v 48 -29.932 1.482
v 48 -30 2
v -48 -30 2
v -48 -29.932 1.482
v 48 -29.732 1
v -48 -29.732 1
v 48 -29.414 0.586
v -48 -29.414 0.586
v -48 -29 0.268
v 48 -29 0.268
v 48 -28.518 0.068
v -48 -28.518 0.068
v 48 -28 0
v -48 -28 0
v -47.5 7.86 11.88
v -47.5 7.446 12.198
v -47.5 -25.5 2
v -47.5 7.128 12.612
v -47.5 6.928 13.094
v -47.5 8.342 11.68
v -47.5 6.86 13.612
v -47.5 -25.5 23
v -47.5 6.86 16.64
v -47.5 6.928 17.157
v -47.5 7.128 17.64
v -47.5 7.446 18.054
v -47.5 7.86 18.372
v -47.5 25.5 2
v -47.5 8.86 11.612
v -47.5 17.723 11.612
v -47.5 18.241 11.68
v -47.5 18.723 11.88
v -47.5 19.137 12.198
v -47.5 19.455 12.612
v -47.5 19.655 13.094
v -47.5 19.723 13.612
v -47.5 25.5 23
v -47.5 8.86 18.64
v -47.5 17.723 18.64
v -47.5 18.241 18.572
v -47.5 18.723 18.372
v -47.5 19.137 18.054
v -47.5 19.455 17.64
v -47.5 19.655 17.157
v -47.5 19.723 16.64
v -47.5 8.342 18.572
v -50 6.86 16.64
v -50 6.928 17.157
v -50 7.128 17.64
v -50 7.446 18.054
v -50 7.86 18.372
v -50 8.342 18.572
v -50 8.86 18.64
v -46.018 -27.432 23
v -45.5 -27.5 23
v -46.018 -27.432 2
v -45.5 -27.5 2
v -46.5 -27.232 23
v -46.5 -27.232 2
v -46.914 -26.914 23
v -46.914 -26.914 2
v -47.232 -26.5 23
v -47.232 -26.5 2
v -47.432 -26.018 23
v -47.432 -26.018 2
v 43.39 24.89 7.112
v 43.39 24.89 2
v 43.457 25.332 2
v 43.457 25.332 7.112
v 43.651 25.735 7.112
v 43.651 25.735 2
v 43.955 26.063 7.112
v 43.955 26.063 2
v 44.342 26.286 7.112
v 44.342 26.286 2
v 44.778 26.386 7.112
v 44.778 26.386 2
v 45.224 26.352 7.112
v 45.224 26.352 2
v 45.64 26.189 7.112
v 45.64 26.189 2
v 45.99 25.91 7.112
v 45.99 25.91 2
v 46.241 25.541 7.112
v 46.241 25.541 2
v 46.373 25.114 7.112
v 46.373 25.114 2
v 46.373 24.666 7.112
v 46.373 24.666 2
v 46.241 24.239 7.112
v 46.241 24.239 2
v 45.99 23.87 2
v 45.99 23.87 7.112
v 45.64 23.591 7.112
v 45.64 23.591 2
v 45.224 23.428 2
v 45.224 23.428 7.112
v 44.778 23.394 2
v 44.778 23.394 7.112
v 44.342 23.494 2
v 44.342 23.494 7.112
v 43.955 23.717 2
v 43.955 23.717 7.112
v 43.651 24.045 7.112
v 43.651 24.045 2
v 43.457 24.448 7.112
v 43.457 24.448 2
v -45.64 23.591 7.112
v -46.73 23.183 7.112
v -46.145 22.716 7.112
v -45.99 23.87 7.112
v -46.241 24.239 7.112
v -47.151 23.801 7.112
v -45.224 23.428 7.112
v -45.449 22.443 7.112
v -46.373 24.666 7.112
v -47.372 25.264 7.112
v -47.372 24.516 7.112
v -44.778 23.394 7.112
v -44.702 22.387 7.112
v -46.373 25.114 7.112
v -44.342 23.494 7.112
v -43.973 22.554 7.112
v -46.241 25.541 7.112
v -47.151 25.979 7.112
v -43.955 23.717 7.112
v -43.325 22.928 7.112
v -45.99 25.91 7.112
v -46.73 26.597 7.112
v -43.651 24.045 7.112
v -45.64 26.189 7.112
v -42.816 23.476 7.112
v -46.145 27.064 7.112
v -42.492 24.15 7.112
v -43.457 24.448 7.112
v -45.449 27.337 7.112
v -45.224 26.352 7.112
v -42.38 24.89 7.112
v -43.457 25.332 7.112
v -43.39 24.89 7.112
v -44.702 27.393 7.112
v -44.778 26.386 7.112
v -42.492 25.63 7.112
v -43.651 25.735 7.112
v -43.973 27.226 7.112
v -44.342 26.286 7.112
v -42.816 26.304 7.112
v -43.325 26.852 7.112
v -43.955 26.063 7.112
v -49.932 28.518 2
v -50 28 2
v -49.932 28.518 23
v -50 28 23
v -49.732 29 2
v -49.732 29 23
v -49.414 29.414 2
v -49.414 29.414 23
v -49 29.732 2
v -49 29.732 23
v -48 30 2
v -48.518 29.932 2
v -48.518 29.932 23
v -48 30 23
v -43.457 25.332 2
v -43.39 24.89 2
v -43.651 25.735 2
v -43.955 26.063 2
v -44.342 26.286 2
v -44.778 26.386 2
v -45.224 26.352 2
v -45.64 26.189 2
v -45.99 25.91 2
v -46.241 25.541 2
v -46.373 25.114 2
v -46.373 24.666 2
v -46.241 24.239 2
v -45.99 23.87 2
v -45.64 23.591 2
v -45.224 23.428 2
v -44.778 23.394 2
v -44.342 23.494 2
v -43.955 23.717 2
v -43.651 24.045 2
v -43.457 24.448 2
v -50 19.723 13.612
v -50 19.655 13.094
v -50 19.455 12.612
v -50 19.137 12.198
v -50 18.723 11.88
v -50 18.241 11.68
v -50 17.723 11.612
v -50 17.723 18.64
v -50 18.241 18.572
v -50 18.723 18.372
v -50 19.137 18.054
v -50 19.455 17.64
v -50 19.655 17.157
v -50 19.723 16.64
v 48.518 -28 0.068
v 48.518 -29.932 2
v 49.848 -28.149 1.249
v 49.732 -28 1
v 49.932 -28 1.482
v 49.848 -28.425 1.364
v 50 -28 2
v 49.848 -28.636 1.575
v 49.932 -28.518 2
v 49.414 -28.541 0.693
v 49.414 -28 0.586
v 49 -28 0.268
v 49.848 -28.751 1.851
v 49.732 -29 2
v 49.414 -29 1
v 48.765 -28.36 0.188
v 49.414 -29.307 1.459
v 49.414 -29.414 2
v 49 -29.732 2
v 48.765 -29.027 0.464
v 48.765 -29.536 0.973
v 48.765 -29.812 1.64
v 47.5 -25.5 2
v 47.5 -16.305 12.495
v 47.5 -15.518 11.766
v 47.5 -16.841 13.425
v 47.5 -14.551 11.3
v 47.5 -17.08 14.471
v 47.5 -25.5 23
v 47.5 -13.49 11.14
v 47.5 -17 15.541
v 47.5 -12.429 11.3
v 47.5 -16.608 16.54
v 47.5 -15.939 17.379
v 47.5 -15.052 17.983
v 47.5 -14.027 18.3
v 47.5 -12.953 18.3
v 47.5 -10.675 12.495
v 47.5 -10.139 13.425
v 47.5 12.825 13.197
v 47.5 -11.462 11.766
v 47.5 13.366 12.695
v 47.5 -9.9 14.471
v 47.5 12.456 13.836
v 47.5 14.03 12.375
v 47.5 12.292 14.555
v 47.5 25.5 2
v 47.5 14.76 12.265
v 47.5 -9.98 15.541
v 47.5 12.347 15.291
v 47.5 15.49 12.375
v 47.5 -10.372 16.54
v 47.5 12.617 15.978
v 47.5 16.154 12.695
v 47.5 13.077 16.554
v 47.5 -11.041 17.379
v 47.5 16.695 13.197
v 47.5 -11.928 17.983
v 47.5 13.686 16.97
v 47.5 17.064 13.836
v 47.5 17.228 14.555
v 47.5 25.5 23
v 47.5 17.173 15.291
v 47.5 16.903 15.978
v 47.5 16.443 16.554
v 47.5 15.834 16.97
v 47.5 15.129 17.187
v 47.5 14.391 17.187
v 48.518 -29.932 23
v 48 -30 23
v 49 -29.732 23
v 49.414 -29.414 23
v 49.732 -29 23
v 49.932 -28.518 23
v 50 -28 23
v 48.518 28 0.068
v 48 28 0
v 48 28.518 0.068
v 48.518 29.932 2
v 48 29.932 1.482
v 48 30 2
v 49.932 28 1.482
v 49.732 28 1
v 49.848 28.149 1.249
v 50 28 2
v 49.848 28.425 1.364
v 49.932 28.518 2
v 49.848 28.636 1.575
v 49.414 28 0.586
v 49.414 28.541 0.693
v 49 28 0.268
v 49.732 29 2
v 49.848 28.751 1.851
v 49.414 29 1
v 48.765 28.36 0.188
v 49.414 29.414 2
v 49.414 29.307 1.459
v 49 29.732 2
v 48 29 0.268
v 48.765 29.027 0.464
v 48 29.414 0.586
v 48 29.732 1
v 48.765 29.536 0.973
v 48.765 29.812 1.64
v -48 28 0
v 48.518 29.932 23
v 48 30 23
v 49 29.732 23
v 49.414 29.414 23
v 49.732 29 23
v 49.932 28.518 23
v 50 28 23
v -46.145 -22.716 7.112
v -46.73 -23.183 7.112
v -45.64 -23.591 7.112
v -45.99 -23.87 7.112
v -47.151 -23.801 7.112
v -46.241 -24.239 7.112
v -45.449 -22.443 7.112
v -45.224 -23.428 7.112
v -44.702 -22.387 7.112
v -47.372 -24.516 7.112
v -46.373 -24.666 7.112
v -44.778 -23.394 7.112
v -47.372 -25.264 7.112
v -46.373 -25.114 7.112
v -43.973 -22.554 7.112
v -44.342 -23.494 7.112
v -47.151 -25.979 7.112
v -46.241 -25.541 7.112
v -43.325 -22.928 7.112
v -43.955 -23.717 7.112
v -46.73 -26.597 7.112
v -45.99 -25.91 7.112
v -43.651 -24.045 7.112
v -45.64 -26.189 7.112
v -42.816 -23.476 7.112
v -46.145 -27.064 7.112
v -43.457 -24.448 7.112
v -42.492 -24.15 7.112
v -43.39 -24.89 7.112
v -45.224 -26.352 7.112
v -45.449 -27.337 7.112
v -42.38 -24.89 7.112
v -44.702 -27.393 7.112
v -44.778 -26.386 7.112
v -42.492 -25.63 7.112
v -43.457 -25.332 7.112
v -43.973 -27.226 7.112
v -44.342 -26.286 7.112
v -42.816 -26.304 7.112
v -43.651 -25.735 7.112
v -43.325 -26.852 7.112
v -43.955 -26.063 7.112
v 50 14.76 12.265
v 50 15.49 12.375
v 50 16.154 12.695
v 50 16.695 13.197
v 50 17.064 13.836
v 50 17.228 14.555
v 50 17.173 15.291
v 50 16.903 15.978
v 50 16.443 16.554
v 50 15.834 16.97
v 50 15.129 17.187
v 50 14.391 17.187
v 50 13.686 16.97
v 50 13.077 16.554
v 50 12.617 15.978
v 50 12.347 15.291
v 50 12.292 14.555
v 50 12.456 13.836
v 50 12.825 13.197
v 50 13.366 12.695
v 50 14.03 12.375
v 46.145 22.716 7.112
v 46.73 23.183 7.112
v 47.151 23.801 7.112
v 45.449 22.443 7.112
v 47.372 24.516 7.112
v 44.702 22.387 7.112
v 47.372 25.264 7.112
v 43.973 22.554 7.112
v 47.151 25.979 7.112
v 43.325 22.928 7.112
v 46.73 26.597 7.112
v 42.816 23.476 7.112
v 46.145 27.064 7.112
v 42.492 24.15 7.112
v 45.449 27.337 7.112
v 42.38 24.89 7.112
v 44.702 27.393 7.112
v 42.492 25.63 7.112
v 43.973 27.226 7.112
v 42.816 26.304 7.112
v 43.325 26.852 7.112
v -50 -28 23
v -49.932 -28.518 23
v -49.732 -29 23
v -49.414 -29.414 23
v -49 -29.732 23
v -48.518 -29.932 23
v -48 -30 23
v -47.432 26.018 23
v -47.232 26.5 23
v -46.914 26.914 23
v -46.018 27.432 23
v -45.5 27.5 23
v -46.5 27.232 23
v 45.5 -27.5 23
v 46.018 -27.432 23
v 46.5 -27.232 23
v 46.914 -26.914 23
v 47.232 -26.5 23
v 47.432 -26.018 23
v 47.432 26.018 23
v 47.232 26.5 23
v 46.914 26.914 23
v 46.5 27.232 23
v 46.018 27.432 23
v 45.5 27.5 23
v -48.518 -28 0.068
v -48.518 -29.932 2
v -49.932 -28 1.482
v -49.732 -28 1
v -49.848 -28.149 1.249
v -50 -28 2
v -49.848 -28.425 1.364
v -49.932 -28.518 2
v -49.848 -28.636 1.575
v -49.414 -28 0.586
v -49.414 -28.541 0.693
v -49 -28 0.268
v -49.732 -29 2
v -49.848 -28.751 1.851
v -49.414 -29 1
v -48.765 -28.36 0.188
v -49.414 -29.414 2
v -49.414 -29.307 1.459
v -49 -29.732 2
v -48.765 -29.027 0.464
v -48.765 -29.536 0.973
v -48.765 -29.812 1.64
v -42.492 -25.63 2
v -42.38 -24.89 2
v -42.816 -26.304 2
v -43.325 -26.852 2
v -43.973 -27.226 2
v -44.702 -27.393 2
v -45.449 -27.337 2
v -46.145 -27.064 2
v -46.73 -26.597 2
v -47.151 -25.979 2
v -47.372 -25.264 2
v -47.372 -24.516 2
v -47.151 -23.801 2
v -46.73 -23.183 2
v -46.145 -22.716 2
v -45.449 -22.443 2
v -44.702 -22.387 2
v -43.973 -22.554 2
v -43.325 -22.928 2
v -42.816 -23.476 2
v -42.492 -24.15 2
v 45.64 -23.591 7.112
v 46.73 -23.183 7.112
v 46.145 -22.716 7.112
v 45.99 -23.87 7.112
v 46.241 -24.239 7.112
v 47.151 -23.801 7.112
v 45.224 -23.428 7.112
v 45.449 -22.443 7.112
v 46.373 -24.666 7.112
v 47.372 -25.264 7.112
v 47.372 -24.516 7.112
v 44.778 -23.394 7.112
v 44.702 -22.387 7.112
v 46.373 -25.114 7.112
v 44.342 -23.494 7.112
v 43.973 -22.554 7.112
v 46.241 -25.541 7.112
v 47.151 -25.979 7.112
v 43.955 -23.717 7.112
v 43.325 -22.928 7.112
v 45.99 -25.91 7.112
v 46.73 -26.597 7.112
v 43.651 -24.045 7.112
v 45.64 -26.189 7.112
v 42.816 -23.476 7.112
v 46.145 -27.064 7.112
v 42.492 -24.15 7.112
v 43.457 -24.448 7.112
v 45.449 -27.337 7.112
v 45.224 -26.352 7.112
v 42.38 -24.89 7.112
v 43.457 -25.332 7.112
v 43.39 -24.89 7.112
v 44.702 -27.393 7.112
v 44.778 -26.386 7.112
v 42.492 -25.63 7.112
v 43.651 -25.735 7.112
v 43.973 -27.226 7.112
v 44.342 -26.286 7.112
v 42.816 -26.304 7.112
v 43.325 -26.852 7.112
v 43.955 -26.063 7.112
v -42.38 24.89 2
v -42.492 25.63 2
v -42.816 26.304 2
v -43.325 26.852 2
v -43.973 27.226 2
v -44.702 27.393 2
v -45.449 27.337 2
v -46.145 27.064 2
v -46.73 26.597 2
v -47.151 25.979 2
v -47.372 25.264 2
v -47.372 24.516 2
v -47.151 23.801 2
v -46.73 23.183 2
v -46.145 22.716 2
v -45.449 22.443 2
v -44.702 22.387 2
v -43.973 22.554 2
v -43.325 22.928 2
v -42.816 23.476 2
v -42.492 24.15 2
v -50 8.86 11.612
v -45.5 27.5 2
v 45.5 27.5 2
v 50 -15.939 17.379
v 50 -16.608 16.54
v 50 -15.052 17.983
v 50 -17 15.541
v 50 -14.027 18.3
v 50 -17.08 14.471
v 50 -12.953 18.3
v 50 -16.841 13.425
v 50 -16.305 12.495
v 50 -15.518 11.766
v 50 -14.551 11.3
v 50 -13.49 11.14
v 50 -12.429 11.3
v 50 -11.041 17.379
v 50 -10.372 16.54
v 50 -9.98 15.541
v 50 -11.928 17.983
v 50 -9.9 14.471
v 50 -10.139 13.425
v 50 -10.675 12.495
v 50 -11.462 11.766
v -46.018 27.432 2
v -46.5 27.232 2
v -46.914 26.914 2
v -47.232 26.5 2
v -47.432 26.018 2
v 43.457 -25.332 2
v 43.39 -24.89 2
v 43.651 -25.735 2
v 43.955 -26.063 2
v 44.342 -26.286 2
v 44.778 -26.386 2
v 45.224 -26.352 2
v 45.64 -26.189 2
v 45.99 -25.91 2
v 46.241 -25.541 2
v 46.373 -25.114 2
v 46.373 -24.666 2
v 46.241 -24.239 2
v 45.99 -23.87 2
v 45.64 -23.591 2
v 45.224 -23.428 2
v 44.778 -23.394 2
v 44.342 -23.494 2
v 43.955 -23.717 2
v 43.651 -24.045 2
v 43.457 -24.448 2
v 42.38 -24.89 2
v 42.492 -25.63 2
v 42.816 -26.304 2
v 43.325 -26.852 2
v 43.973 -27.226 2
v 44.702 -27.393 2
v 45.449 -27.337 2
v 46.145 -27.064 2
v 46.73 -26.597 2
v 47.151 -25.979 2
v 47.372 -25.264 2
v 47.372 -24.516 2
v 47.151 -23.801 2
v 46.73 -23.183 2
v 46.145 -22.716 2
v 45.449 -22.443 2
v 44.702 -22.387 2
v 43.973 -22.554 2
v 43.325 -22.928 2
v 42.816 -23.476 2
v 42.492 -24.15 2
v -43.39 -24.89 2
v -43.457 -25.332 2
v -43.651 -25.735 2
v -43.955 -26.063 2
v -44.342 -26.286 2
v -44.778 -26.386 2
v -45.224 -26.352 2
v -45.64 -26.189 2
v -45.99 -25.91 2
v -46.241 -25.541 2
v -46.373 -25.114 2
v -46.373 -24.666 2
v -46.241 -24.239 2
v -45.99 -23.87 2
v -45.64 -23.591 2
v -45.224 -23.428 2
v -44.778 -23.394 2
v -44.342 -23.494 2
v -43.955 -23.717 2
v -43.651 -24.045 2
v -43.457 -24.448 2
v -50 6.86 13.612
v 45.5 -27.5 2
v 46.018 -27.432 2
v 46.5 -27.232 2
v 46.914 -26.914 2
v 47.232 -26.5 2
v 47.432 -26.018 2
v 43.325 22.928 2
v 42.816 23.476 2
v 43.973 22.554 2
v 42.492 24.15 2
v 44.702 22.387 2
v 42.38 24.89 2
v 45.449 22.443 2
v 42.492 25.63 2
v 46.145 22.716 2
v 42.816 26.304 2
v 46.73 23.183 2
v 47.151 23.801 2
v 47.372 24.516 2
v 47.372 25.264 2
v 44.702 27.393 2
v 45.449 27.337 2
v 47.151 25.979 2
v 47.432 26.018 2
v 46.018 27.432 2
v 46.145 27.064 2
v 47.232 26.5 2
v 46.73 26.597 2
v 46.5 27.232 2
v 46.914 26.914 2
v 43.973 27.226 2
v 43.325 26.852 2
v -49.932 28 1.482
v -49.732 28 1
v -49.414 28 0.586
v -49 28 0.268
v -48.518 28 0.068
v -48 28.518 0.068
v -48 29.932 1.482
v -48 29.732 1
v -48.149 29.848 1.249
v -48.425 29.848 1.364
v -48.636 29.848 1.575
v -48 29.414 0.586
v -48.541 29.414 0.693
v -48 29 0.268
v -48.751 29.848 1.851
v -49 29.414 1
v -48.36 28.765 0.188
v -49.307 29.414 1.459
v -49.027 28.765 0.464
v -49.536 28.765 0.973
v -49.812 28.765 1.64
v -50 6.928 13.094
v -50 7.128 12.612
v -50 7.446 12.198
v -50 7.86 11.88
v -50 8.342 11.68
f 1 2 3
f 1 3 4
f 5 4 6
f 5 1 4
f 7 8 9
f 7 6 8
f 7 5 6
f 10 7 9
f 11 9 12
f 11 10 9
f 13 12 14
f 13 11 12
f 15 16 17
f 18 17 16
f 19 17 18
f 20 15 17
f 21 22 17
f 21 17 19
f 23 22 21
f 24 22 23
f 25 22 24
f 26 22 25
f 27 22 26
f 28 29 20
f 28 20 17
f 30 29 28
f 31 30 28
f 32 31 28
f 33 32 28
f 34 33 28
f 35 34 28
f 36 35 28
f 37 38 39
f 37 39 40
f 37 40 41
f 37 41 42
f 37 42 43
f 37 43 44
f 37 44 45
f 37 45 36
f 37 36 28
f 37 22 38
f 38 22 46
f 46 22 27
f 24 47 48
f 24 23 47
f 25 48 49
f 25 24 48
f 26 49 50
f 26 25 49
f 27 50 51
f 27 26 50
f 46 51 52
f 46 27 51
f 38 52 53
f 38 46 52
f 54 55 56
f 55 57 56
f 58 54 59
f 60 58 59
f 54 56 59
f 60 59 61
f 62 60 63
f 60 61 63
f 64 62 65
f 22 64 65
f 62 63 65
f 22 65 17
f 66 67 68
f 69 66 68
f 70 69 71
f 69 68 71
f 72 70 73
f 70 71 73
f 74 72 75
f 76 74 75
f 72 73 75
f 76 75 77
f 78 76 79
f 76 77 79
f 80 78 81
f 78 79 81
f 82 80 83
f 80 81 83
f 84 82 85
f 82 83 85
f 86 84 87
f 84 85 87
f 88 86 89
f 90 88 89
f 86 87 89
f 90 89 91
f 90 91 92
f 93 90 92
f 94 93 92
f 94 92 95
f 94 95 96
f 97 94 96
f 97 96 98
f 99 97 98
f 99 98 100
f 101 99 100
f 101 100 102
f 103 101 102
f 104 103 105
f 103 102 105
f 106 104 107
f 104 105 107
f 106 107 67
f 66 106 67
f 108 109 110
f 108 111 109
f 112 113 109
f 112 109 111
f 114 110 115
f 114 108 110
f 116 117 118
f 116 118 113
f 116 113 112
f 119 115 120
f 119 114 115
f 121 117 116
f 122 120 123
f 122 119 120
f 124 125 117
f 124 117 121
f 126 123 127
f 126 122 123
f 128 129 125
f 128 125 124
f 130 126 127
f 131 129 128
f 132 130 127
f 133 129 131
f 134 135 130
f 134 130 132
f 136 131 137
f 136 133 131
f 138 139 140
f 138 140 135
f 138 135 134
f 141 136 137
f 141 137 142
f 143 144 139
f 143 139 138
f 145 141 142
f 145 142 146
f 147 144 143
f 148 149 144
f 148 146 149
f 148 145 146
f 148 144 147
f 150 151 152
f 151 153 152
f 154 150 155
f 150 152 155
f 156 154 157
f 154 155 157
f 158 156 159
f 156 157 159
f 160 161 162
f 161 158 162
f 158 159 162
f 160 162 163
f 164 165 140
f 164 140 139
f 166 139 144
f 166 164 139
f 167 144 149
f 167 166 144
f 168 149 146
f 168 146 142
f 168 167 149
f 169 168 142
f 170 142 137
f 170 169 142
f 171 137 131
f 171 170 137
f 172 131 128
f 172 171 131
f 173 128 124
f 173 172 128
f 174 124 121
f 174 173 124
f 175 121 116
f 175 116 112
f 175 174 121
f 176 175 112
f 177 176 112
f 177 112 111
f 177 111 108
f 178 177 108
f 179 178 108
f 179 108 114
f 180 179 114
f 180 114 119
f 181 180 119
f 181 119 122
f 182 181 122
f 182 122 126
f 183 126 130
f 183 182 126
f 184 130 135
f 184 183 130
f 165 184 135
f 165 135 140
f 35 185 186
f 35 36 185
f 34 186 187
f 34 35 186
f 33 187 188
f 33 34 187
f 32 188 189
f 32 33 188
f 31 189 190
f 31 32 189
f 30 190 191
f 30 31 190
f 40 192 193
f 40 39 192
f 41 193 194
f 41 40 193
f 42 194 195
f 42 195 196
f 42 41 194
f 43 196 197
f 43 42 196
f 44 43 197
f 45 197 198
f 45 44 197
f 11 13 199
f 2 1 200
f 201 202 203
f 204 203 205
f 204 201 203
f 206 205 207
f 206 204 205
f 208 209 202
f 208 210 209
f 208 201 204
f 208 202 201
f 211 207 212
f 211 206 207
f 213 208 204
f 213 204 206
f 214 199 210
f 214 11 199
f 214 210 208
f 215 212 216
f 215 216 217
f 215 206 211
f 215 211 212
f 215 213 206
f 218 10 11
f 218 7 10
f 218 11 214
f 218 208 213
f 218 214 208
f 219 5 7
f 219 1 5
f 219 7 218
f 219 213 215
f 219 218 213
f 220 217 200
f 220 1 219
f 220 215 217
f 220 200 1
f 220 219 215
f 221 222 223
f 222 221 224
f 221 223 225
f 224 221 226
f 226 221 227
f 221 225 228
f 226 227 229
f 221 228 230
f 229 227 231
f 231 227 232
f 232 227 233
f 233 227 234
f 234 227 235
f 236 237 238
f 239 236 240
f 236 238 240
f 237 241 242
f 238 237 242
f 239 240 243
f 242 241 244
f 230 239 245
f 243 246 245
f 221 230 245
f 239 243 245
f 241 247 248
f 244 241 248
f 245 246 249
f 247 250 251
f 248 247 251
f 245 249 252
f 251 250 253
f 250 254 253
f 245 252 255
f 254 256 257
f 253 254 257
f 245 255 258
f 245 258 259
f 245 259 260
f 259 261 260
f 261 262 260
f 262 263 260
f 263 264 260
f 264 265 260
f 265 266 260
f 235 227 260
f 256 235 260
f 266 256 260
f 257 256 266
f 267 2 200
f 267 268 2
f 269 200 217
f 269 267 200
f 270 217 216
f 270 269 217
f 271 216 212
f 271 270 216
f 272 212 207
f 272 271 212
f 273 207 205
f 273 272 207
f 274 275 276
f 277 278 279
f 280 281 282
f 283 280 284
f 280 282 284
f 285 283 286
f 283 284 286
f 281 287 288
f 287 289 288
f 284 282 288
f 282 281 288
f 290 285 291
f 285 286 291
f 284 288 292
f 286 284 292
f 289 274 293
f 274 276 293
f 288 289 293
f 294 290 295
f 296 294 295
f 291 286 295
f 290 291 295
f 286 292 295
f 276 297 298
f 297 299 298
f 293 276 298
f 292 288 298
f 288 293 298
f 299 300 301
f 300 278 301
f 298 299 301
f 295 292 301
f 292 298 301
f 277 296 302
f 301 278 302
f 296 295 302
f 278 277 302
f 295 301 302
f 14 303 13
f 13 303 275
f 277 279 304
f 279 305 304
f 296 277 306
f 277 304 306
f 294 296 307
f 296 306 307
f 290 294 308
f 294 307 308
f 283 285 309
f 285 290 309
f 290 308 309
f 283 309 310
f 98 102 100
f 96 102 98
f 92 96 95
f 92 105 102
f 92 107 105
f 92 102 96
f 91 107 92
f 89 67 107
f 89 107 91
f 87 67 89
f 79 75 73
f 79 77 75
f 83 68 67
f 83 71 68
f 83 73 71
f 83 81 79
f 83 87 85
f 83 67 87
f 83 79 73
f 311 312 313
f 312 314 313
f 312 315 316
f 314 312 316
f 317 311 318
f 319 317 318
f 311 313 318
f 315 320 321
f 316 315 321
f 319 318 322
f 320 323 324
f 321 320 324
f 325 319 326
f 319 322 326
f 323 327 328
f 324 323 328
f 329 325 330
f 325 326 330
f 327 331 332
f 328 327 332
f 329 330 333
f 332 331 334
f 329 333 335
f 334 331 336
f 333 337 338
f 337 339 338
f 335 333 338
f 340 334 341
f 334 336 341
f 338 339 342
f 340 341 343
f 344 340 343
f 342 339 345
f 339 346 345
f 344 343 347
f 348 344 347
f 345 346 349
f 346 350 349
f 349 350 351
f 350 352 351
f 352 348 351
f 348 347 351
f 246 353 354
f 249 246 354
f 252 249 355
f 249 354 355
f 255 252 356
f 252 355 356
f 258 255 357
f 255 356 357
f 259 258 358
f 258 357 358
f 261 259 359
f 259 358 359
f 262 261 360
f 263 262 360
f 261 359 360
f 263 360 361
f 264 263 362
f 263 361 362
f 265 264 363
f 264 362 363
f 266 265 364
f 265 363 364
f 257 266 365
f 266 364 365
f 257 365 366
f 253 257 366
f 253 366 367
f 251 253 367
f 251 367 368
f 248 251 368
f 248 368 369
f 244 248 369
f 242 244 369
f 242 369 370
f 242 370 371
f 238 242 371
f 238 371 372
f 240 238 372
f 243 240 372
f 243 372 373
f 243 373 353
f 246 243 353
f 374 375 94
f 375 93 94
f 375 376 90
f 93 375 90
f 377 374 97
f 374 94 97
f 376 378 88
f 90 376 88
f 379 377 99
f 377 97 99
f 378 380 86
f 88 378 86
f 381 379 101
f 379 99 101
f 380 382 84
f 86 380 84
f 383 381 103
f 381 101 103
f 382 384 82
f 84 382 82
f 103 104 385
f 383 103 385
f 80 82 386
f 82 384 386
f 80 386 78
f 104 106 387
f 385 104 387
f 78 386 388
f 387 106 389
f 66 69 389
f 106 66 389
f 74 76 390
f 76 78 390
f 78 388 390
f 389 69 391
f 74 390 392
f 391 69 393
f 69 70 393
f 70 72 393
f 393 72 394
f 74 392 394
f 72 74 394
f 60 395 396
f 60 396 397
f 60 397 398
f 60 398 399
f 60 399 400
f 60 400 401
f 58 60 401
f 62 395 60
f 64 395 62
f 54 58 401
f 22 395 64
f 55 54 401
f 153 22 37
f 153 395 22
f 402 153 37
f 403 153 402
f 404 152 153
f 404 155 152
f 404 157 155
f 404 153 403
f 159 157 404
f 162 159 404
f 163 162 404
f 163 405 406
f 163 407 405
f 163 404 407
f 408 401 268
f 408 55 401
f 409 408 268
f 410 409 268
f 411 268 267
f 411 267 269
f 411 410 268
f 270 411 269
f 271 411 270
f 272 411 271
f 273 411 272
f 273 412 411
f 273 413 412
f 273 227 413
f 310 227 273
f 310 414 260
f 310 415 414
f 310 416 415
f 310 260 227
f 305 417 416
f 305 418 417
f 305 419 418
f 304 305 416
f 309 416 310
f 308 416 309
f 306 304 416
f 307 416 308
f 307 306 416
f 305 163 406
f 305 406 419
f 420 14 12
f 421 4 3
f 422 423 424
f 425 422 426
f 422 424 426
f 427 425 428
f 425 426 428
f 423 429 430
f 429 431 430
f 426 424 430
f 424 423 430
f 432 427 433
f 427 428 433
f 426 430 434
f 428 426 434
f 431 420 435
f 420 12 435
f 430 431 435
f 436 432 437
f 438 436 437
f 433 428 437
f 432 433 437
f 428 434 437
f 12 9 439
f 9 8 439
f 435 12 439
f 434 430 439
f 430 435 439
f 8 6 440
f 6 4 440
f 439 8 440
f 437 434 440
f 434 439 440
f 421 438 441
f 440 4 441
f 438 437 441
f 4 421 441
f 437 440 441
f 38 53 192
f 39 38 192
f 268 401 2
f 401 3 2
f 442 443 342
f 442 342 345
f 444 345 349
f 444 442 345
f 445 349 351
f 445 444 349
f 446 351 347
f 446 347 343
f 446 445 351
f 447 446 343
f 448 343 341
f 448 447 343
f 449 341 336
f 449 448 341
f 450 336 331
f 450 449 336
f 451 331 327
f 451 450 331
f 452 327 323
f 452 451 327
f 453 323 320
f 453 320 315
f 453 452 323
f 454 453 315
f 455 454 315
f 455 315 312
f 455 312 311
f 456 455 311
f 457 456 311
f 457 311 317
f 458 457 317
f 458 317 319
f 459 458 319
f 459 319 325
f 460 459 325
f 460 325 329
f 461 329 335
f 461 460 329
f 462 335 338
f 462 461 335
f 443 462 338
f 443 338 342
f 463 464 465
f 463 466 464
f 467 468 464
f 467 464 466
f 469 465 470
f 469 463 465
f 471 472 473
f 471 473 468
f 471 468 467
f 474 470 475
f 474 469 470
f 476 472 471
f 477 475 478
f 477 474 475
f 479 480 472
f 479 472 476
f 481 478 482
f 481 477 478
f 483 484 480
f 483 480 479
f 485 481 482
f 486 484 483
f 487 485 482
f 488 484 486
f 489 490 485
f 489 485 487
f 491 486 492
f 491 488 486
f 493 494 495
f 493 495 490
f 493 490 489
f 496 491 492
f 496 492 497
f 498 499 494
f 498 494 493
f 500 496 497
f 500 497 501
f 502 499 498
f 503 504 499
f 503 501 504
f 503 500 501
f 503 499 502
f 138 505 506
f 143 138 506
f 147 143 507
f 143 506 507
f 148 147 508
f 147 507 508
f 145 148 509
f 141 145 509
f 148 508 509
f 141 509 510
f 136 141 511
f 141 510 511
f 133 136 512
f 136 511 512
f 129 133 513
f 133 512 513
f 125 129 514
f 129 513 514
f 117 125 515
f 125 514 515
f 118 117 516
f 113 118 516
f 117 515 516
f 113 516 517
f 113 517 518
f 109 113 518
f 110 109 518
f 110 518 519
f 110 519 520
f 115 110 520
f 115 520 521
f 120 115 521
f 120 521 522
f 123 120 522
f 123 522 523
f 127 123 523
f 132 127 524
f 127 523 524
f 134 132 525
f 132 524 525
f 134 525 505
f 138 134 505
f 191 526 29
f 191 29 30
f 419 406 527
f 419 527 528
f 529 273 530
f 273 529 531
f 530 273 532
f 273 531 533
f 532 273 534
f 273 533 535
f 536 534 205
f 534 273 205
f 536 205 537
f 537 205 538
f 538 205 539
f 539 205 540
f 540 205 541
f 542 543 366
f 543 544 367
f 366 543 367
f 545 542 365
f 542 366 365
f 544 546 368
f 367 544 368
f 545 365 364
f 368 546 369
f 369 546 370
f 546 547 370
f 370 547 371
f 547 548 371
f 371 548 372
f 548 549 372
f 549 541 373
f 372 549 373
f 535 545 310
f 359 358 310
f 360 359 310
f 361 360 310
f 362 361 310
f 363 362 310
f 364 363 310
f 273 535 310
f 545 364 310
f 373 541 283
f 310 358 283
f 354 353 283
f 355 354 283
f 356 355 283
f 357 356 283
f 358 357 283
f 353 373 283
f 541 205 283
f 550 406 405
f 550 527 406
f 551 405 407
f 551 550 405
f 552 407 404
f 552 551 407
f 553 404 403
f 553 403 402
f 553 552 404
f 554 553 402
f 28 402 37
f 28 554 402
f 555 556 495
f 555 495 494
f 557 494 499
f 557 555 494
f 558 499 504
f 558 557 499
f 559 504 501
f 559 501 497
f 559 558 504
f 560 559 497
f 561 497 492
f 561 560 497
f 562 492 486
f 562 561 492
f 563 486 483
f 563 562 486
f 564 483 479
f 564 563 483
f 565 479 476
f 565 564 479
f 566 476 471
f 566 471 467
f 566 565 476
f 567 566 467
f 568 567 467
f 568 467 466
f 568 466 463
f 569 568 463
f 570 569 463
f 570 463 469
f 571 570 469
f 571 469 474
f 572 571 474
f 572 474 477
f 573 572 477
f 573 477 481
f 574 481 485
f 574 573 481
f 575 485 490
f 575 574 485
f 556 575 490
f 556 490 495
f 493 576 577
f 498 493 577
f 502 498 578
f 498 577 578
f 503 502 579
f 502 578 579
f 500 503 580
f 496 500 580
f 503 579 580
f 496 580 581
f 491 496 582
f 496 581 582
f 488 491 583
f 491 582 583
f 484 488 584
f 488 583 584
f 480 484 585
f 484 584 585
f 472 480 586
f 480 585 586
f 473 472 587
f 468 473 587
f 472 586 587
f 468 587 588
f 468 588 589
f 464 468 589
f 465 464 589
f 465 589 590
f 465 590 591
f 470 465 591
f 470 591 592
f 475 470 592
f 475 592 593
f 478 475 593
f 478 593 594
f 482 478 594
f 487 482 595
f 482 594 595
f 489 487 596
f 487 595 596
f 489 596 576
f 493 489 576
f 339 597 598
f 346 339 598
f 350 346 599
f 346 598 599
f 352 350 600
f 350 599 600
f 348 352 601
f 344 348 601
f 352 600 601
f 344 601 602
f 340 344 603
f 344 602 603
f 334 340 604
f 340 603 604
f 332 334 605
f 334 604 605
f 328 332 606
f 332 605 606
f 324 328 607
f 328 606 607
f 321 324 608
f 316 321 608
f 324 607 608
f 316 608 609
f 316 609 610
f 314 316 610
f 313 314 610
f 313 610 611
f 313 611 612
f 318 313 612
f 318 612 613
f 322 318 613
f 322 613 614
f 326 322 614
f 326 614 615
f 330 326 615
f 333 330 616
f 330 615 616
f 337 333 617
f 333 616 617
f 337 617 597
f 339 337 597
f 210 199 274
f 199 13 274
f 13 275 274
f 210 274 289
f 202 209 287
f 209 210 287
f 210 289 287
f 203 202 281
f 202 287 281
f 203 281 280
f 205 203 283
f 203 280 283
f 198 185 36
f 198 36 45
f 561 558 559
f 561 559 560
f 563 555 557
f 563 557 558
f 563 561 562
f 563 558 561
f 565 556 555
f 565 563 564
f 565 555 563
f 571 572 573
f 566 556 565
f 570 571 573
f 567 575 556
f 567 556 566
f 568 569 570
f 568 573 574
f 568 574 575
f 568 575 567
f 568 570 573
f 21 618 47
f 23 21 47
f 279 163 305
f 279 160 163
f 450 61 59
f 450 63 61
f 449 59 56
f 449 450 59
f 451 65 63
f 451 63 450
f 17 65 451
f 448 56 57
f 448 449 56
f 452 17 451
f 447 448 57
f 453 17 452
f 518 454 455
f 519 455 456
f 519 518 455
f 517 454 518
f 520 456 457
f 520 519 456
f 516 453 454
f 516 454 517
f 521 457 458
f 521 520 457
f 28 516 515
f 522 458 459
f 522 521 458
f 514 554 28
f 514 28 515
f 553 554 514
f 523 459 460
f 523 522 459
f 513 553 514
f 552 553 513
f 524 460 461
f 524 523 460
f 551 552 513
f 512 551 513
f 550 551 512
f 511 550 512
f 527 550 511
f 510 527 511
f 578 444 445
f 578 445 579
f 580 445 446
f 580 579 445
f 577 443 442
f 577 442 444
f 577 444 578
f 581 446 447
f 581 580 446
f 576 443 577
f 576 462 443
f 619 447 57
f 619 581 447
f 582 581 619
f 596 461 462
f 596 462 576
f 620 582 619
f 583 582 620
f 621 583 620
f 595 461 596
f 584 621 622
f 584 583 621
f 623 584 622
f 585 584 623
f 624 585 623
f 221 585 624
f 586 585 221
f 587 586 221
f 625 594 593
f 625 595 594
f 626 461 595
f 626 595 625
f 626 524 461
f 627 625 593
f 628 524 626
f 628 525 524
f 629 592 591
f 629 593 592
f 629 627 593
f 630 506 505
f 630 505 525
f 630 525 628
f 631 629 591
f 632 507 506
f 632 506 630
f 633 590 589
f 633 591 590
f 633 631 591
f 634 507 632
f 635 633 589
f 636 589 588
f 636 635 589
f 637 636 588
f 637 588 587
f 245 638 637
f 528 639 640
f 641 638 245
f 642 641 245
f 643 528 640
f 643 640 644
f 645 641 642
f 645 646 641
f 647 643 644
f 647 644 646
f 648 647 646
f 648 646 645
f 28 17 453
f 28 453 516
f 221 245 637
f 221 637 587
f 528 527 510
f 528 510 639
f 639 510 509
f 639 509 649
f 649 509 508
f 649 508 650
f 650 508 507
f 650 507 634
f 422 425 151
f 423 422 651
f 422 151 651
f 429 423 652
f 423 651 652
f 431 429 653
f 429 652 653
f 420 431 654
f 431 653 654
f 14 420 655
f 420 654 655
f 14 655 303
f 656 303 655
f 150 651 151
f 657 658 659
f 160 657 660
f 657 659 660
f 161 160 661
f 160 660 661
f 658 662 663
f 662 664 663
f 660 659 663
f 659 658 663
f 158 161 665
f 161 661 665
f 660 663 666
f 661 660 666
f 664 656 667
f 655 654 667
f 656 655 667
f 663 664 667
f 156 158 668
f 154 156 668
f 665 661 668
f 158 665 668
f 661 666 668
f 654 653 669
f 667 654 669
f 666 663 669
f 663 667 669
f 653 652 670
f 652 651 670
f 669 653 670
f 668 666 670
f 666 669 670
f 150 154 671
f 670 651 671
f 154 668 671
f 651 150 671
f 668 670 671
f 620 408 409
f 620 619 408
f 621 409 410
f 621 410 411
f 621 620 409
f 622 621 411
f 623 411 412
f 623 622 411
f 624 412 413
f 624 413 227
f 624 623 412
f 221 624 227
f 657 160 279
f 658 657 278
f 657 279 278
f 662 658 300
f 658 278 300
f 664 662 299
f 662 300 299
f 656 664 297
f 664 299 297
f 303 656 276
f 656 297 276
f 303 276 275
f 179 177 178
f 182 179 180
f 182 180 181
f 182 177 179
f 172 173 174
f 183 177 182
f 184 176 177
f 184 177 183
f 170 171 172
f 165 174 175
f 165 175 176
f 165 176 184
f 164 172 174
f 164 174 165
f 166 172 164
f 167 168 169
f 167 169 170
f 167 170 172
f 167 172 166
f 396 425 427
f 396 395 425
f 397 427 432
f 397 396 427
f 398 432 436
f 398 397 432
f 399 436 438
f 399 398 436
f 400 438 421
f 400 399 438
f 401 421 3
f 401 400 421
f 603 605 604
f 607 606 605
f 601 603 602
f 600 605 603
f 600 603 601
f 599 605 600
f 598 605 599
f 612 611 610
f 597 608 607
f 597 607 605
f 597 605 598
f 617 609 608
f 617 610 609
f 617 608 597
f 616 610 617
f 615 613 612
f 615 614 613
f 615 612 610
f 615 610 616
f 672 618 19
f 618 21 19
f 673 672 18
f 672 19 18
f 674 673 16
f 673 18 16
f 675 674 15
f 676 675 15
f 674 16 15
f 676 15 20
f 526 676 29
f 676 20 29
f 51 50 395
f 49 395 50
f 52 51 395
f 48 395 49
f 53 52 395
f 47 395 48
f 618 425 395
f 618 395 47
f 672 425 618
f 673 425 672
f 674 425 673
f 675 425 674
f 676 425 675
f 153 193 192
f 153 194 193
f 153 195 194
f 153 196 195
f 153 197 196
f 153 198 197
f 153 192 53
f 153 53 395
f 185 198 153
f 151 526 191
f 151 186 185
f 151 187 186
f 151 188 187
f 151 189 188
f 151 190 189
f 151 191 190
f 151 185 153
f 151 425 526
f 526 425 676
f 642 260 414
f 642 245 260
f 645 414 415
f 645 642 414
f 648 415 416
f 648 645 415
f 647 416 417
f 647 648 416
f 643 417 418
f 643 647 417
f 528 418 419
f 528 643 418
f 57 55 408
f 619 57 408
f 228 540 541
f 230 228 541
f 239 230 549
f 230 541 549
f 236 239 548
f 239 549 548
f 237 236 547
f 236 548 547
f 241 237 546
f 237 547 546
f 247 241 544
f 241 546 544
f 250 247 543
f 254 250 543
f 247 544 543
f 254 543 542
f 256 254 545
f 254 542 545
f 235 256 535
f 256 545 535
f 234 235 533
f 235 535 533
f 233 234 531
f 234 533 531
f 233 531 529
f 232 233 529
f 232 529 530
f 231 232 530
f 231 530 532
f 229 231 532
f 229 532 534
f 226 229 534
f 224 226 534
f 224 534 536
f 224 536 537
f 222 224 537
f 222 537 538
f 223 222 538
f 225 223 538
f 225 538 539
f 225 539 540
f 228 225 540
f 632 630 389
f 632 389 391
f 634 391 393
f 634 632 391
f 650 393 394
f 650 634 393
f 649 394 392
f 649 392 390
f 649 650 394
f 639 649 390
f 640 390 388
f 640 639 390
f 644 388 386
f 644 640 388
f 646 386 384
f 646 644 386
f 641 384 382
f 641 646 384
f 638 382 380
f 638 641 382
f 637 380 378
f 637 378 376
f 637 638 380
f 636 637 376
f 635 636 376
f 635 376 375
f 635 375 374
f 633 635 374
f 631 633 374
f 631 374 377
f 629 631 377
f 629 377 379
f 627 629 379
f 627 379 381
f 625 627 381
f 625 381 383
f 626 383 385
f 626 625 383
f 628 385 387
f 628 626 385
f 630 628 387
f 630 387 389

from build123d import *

# Parameters (mm, degrees)
SKETCH1_W                 = 100
SKETCH1_H                 = 60
BOSS_EXTRUDE1_DEPTH       = 23
SKETCH2_W                 = 95
SKETCH2_H                 = 55
CUT_EXTRUDE1_DEPTH        = 21
SKETCH3_R                 = 2.51
SKETCH3_R_2               = 1.5
BOSS_EXTRUDE6_DEPTH       = 5.112
MIRROR2_COPY_1_SKETCH_R   = 2.51
MIRROR2_COPY_1_SKETCH_R_2 = 1.5
MIRROR2_COPY_1_DEPTH      = 5.112
FILLET1_R                 = 2
CUT_EXTRUDE2_REACH        = 108.907
SKETCH4_W                 = 7.027664142
SKETCH4_H                 = 12.863273411
FILLET2_R                 = 2
CUT_EXTRUDE3_REACH        = 108.907
SKETCH5_R                 = 3.6
SKETCH5_R_2               = 2.475


with BuildPart() as part:
    # Sketch1 → Boss-Extrude1 (new body)
    with BuildSketch(Plane.XY):
        Rectangle(SKETCH1_W, SKETCH1_H)
    extrude(amount=BOSS_EXTRUDE1_DEPTH)

    # Sketch2 → Cut-Extrude1 (cut)
    with BuildSketch(Plane.XY.offset(23)):
        Rectangle(SKETCH2_W, SKETCH2_H)
    extrude(amount=-CUT_EXTRUDE1_DEPTH, mode=Mode.SUBTRACT)

    # Sketch3 → Boss-Extrude6 (add)
    with BuildSketch(Plane.XY.offset(2)):
        with Locations((-44.89, 24.89)):
            Circle(SKETCH3_R)
        with Locations((-44.89, 24.89)):
            Circle(SKETCH3_R_2, mode=Mode.SUBTRACT)
    boss_extrude6 = extrude(amount=BOSS_EXTRUDE6_DEPTH)

    # Mirror1: Boss-Extrude6 across plane
    add(boss_extrude6.mirror(Plane.ZX))

    # Mirror2: Boss-Extrude6 across plane
    add(boss_extrude6.mirror(Plane(origin=(0, 0, 0), x_dir=(0, 0, 1), z_dir=(1, 0, 0))))

    # Mirror2 copy 1 sketch → Mirror2 copy 1 (add)
    with BuildSketch(Plane(origin=(0, 0, 2), x_dir=(-1, 0, 0), z_dir=(0, 0, 1))):
        with Locations((-44.89, 24.89)):
            Circle(MIRROR2_COPY_1_SKETCH_R)
        with Locations((-44.89, 24.89)):
            Circle(MIRROR2_COPY_1_SKETCH_R_2, mode=Mode.SUBTRACT)
    extrude(amount=MIRROR2_COPY_1_DEPTH)

    # Fillet1
    fillet1_edges = [part.edges().sort_by_distance(p)[0] for p in [
        (-47.5, 27.5, 12.5),
        (47.5, 27.5, 12.5),
        (47.5, -27.5, 12.5),
        (-47.5, -27.5, 12.5),
        (0, -30, 0),
        (-50, 0, 0),
        (0, 30, 0),
        (50, 0, 0),
        (50, -30, 11.5),
        (-50, -30, 11.5),
        (-50, 30, 11.5),
        (50, 30, 11.5),
    ]]
    fillet(fillet1_edges, radius=FILLET1_R)

    # Sketch4 → Cut-Extrude2 (cut, up to next)
    with BuildSketch(Plane.ZY.offset(50), mode=Mode.PRIVATE) as cut_extrude2_sk1:
        with Locations((15.125832071, 13.291636706)):
            Rectangle(SKETCH4_W, SKETCH4_H)
    cut_extrude2_tool1 = extrude(cut_extrude2_sk1.sketch, amount=-CUT_EXTRUDE2_REACH, mode=Mode.PRIVATE) & part.part
    add(cut_extrude2_tool1.solids().sort_by_distance((-50, 13.291637, 15.125832))[0], mode=Mode.SUBTRACT)

    # Fillet2
    fillet2_edges = [part.edges().sort_by_distance(p)[0] for p in [
        (-48.75, 19.723273411, 11.612),
        (-48.75, 6.86, 11.612),
        (-48.75, 6.86, 18.639664142),
        (-48.75, 19.723273411, 18.639664142),
    ]]
    fillet(fillet2_edges, radius=FILLET2_R)

    # Sketch5 → Cut-Extrude3 (cut, up to next)
    with BuildSketch(Plane(origin=(50, 0, 0), x_dir=(0, 0, -1), z_dir=(1, 0, 0)), mode=Mode.PRIVATE) as cut_extrude3_sk1:
        with Locations((-14.74, -13.49)):
            Circle(SKETCH5_R)
    cut_extrude3_tool1 = extrude(cut_extrude3_sk1.sketch, amount=-CUT_EXTRUDE3_REACH, mode=Mode.PRIVATE) & part.part
    # Sketch5 → Cut-Extrude3 (cut, up to next)
    with BuildSketch(Plane(origin=(50, 0, 0), x_dir=(0, 0, -1), z_dir=(1, 0, 0)), mode=Mode.PRIVATE) as cut_extrude3_sk2:
        with Locations((-14.74, 14.76)):
            Circle(SKETCH5_R_2)
    cut_extrude3_tool2 = extrude(cut_extrude3_sk2.sketch, amount=-CUT_EXTRUDE3_REACH, mode=Mode.PRIVATE) & part.part
    add(cut_extrude3_tool1.solids().sort_by_distance((50, -13.49, 14.74))[0], mode=Mode.SUBTRACT)
    add(cut_extrude3_tool2.solids().sort_by_distance((50, 14.76, 14.74))[0], mode=Mode.SUBTRACT)


solid = part.part
